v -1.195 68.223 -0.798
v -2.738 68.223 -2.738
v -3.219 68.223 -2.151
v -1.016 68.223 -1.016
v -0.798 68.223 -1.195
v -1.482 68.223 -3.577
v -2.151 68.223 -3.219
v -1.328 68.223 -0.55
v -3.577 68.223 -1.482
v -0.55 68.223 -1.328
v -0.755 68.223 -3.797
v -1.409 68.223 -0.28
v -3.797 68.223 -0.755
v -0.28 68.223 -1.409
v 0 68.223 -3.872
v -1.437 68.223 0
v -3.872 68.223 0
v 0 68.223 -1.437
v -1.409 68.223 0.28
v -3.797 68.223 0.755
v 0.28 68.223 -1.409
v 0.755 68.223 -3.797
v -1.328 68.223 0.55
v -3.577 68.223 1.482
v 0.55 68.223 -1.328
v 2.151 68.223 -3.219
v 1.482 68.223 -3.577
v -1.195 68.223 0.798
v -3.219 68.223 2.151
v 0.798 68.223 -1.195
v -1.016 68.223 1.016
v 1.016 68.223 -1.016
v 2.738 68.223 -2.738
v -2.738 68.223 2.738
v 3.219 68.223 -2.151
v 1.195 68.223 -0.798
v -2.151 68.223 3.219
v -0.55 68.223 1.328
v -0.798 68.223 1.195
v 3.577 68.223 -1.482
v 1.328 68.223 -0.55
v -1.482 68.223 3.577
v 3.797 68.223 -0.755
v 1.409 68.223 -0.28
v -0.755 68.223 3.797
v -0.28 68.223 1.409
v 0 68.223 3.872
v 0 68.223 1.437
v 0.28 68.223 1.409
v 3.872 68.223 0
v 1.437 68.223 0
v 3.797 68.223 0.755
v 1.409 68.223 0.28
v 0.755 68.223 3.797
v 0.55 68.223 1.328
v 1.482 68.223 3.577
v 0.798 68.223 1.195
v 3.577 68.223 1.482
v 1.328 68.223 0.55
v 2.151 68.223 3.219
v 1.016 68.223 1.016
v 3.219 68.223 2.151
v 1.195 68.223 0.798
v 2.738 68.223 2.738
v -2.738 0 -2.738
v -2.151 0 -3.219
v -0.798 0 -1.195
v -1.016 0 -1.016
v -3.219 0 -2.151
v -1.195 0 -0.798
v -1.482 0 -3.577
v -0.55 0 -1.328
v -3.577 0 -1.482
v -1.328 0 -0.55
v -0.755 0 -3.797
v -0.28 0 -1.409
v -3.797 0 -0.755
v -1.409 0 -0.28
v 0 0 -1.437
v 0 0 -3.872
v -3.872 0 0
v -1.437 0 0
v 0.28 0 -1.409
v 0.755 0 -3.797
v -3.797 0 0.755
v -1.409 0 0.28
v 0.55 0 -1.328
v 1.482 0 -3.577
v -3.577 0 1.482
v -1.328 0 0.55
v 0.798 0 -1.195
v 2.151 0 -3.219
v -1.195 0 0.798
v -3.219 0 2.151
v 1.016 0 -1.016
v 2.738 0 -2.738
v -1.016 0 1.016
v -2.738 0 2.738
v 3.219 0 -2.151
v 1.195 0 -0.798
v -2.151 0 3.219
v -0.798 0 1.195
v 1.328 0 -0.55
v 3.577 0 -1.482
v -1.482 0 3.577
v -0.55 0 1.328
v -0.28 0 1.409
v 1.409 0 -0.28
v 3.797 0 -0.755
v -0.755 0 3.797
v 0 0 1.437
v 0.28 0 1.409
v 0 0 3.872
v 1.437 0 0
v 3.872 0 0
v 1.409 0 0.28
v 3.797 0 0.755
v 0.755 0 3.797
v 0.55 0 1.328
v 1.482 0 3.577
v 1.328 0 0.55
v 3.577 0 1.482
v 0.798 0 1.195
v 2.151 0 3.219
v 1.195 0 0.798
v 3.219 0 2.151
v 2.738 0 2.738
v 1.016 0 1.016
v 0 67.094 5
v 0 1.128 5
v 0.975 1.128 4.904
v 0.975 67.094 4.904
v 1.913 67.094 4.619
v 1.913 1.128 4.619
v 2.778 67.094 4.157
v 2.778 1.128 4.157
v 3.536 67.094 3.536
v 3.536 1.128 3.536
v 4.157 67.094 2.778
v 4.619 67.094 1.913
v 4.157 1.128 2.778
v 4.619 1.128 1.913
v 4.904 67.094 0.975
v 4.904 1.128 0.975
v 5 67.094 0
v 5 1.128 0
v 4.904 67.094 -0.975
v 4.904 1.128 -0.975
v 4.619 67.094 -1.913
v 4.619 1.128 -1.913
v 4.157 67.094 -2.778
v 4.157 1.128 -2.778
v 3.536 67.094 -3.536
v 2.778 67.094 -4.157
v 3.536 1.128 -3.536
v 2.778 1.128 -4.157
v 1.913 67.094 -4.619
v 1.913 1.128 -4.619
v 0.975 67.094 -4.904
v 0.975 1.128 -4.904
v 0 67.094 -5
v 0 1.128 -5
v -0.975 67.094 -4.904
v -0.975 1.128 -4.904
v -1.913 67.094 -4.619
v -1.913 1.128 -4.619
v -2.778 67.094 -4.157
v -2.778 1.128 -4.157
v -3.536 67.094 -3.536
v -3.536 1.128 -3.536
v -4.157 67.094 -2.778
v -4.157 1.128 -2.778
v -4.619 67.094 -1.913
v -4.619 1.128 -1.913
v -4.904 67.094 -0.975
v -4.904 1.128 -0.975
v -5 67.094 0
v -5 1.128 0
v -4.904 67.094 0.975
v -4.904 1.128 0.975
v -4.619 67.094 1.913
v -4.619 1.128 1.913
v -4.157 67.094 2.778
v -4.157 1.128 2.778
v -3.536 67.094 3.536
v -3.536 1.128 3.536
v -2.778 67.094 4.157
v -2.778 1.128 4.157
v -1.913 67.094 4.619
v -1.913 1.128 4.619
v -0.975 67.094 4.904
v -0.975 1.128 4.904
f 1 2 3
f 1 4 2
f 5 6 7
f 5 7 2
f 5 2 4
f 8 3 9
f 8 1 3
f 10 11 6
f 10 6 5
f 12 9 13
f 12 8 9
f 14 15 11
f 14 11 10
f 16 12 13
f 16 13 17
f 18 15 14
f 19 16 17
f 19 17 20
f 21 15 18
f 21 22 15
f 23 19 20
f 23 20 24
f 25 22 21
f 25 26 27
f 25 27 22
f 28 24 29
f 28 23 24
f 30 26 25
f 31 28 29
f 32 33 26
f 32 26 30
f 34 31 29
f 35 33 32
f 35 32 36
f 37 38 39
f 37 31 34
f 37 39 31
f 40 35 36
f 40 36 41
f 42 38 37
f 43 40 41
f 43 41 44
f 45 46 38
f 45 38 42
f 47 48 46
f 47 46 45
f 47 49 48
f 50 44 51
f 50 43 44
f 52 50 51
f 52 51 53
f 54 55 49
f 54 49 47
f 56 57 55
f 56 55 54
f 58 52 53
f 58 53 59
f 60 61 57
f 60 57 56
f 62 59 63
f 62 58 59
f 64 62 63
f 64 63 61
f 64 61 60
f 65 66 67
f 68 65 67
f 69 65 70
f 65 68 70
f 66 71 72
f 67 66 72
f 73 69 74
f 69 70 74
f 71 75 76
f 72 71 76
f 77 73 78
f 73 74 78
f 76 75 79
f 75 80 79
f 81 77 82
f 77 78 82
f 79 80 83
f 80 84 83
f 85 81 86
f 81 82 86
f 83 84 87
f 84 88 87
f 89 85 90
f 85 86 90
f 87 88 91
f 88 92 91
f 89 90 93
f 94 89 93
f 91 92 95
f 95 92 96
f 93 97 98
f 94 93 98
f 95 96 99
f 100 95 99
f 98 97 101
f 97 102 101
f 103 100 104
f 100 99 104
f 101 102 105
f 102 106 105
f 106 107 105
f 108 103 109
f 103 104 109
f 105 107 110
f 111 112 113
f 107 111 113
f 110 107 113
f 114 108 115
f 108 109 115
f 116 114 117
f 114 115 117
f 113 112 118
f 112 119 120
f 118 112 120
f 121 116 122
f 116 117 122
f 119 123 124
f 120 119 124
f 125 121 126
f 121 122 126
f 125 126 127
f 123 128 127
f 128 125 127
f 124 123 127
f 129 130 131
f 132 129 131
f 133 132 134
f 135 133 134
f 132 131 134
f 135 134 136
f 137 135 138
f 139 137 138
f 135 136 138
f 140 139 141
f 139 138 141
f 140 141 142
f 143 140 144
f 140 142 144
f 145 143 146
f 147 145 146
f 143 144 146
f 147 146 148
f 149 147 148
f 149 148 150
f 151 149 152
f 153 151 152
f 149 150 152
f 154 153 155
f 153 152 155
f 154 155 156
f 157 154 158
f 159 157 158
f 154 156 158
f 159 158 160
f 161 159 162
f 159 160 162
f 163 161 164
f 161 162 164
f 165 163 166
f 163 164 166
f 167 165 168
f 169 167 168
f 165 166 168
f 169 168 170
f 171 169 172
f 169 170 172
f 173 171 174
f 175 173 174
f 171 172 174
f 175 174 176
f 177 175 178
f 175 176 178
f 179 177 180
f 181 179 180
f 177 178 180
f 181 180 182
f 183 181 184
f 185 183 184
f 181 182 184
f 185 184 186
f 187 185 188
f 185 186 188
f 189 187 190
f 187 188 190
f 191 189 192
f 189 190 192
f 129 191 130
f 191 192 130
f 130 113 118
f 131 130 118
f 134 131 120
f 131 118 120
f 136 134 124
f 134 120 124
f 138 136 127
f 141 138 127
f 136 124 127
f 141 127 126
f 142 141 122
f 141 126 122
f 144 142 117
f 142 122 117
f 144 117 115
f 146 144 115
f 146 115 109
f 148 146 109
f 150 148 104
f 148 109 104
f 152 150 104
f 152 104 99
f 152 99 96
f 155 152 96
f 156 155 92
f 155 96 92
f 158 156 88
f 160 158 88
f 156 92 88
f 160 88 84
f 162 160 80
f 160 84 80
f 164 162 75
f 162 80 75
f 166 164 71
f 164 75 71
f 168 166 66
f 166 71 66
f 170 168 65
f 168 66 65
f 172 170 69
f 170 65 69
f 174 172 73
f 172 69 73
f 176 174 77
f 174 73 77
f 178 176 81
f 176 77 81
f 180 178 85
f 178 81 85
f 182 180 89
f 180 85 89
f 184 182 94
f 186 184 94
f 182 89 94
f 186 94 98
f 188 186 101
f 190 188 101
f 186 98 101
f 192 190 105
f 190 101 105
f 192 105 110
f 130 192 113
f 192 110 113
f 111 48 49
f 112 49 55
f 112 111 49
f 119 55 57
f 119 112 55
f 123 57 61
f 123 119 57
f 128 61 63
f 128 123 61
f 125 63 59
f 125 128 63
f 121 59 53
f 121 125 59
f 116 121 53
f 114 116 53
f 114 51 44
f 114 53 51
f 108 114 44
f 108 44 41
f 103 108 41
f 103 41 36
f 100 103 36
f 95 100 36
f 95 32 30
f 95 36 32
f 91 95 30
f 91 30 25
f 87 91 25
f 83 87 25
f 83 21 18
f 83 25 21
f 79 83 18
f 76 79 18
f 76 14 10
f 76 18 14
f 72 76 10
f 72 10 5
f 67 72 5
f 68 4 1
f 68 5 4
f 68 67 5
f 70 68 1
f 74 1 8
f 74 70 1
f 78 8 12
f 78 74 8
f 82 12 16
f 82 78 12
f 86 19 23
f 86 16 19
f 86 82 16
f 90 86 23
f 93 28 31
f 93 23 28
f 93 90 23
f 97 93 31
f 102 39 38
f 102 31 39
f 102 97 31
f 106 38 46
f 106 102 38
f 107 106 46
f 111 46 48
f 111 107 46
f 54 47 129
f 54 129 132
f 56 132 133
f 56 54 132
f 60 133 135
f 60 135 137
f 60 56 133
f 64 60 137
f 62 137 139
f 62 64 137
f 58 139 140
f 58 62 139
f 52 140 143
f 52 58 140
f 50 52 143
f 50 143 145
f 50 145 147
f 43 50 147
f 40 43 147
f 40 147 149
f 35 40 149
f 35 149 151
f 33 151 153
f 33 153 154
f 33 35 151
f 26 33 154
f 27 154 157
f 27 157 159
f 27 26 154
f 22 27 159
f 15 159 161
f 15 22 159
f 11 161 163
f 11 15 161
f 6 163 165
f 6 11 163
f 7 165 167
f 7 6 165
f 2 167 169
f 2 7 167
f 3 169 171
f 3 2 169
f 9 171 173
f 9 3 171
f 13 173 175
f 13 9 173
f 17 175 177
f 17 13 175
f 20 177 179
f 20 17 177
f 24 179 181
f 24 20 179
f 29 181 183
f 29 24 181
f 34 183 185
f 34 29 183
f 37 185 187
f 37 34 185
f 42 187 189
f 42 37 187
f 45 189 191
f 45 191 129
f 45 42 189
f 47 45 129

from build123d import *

# Parameters (mm, degrees)
SKETCH1_R           = 5
BOSS_EXTRUDE1_DEPTH = 68.22263724
SKETCH2_R           = 1.437105979
CUT_EXTRUDE1_DEPTH  = 69.588105616
CHAMFER1_SIZE       = 1.128454846


with BuildPart() as part:
    # Sketch1 → Boss-Extrude1 (new body)
    with BuildSketch(Plane(origin=(0, 0, 0), x_dir=(1, 0, 0), z_dir=(0, 1, 0))):
        Circle(SKETCH1_R)
    extrude(amount=BOSS_EXTRUDE1_DEPTH)

    # Sketch2 → Cut-Extrude1 (cut, through all)
    with BuildSketch(Plane(origin=(0, 0, 0), x_dir=(1, 0, 0), z_dir=(0, 1, 0))):
        Circle(SKETCH2_R)
    extrude(amount=CUT_EXTRUDE1_DEPTH, mode=Mode.SUBTRACT)

    # Chamfer1
    chamfer1_edges = [part.edges().sort_by_distance(p)[0] for p in [
        (-5, 68.22263724, 0),
        (-5, 0, 0),
    ]]
    chamfer(chamfer1_edges, length=CHAMFER1_SIZE)


solid = part.part
